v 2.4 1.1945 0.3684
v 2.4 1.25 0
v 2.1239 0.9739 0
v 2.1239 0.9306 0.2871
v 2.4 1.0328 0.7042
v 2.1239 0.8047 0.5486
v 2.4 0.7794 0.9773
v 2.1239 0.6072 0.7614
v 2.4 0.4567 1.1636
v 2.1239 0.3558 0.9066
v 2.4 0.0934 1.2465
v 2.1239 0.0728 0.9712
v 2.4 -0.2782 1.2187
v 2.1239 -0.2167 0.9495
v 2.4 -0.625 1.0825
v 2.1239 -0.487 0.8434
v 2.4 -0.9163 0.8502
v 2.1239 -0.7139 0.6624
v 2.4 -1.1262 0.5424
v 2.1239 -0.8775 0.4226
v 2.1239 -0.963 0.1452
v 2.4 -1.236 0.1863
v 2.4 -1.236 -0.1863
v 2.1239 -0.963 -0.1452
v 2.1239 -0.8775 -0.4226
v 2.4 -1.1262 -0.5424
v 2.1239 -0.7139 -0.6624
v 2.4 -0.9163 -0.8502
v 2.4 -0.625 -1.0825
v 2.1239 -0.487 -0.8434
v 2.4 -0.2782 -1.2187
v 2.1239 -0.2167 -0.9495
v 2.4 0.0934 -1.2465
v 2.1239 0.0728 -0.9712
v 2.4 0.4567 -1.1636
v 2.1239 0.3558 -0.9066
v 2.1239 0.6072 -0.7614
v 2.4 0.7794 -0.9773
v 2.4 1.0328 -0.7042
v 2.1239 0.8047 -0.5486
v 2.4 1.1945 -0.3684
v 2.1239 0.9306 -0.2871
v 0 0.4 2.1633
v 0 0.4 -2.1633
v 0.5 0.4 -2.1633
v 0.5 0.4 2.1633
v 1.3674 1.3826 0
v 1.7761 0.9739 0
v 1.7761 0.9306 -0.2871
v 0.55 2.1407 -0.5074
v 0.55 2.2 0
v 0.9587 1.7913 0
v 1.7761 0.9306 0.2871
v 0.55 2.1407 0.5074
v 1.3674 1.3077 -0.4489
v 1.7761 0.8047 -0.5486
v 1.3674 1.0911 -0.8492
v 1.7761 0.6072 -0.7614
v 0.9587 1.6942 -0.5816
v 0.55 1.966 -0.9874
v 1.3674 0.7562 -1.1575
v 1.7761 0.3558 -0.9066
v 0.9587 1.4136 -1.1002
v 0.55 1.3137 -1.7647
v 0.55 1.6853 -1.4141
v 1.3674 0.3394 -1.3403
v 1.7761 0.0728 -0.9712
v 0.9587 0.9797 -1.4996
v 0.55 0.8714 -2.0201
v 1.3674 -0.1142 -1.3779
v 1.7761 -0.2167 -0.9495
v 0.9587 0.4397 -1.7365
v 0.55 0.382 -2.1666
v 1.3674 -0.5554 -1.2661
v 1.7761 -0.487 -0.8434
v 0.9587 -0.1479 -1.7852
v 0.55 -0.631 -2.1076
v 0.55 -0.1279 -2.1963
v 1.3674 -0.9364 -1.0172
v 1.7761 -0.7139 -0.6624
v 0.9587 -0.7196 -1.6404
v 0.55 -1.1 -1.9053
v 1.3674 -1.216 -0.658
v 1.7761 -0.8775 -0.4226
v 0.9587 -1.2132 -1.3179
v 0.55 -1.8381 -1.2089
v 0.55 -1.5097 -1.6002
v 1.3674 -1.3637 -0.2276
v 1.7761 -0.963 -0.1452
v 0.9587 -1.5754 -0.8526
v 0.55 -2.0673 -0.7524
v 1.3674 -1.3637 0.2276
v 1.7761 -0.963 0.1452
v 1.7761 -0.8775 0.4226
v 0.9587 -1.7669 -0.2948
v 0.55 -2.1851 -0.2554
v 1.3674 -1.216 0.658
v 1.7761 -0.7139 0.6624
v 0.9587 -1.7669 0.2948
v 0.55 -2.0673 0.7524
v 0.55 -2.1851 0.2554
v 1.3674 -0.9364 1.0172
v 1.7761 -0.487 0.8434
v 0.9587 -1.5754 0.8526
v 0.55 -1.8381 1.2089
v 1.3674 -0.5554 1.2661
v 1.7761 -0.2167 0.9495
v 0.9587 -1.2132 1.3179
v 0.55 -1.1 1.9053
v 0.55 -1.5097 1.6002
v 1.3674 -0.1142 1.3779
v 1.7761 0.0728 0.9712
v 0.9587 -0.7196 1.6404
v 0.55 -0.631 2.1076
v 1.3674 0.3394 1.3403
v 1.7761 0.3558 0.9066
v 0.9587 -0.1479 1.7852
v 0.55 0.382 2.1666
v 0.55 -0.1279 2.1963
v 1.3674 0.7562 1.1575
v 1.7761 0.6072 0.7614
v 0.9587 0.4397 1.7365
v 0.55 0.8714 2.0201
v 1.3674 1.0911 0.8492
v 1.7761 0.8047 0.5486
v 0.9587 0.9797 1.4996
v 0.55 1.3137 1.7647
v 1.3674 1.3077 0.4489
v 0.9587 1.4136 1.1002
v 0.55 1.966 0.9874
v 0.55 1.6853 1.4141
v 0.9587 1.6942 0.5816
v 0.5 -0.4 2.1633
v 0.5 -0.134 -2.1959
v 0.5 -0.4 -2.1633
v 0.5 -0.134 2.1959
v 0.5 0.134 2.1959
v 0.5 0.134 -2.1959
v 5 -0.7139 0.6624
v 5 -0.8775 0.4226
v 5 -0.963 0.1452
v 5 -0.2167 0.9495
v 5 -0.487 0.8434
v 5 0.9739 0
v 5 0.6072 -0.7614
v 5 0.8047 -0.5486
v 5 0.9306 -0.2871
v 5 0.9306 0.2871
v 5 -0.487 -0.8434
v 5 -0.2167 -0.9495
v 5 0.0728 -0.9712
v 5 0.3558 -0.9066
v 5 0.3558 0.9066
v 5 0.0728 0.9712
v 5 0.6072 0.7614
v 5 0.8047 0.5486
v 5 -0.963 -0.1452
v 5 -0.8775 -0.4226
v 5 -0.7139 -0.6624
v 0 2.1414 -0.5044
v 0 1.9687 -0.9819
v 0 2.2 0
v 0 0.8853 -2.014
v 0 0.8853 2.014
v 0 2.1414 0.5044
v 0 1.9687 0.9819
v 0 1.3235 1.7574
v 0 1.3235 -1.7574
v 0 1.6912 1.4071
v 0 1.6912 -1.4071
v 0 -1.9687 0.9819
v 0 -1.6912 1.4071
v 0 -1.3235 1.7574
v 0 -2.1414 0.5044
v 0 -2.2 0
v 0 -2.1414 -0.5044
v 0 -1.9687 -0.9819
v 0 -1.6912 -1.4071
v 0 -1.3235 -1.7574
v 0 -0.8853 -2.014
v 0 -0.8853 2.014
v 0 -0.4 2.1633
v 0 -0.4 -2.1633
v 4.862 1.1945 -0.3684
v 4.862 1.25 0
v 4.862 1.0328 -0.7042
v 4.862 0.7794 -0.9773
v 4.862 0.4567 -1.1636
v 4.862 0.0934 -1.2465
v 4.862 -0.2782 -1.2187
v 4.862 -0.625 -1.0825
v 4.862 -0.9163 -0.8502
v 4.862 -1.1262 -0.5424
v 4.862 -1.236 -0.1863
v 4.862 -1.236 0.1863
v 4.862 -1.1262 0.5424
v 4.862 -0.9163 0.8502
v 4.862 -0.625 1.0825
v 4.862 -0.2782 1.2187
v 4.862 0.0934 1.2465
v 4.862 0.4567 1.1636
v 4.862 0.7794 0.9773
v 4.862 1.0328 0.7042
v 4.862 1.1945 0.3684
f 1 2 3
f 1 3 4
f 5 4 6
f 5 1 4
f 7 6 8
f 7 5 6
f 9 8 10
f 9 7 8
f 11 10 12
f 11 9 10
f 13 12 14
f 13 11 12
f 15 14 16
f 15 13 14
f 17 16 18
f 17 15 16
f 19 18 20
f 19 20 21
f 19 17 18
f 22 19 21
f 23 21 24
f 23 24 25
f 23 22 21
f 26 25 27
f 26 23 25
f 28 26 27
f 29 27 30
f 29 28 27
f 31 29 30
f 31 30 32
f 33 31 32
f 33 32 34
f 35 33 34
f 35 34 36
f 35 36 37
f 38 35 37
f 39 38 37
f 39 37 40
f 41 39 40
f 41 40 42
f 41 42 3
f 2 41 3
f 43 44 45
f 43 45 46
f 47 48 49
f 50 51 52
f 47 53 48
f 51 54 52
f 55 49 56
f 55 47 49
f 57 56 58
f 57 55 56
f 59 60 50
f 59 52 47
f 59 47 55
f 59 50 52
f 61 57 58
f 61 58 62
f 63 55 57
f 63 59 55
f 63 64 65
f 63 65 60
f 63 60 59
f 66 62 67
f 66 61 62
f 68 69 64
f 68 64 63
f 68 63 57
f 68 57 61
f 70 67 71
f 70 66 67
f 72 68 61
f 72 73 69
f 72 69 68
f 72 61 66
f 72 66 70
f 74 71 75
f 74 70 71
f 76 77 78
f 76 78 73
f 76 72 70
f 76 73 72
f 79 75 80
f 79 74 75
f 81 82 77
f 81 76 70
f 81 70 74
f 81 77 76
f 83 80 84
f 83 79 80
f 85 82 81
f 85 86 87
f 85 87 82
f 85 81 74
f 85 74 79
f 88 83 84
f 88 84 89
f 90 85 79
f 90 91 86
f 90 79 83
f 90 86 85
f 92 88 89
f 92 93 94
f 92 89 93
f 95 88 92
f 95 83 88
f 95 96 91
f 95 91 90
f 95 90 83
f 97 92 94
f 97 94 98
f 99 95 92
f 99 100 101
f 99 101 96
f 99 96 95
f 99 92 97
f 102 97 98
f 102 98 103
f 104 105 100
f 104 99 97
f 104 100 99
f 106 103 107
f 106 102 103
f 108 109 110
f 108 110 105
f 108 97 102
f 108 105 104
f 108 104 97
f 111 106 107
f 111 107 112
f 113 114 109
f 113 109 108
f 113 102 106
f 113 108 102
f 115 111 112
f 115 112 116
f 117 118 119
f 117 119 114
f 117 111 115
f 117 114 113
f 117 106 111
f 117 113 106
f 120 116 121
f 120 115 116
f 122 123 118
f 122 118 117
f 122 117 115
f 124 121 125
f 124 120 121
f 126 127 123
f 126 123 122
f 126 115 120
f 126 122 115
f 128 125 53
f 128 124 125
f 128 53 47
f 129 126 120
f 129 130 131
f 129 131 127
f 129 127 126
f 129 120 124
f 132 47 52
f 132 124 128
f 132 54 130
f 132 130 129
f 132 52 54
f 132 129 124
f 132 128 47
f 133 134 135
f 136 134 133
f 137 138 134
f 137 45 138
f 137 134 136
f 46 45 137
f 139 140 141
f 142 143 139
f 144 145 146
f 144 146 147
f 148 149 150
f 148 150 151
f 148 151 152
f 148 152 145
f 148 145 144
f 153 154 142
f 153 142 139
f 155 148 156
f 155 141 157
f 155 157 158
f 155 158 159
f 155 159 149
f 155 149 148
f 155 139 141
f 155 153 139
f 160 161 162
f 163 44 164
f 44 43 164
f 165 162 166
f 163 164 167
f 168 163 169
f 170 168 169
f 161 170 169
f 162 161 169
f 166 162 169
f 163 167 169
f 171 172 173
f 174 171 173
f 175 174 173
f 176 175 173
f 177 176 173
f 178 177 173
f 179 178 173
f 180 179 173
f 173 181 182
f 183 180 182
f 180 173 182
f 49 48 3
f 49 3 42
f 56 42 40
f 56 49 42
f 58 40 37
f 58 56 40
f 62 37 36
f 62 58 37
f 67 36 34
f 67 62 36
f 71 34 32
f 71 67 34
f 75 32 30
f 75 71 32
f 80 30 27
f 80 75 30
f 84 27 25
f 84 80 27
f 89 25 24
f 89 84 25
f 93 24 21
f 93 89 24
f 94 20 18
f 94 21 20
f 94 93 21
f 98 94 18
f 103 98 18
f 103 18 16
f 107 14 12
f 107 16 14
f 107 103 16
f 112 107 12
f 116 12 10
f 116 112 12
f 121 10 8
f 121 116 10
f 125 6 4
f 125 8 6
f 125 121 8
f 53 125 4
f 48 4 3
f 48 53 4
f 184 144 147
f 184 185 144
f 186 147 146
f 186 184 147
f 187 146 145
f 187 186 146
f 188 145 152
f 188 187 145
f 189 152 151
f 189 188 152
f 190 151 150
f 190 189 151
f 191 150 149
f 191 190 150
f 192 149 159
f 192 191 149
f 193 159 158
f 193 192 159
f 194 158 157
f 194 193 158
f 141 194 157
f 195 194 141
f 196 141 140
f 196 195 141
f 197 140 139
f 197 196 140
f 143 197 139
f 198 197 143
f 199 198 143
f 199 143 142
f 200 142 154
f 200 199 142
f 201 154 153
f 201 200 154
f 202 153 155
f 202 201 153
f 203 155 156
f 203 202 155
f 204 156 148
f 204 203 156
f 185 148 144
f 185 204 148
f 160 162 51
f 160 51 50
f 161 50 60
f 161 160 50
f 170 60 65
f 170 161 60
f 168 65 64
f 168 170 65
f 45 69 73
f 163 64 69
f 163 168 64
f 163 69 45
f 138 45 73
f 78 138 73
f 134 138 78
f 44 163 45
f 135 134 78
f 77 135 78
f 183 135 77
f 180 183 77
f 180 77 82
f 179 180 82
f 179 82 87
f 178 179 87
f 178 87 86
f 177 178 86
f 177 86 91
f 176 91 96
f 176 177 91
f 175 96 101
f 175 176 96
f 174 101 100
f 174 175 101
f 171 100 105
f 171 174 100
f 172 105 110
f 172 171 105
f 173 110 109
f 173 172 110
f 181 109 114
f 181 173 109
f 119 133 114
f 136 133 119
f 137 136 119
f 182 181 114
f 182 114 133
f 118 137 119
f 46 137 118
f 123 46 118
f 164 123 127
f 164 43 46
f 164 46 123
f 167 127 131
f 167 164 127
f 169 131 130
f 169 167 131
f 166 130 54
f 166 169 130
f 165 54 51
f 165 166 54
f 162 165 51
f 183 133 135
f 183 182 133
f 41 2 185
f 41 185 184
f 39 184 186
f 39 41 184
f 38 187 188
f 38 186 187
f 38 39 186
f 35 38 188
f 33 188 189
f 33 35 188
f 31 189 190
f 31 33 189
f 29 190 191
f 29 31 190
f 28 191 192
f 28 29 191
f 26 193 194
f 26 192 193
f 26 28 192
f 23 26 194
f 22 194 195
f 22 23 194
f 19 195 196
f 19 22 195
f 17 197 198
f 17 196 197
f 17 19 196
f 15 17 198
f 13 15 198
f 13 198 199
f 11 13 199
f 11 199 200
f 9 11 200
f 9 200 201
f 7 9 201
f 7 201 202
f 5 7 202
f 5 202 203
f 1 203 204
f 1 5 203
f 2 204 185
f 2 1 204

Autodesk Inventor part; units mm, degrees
ref_plane "YZ Plane" through (0, 0, 0) normal (1, 0, 0) x (0, 1, 0)
ref_plane "XZ Plane" through (0, 0, 0) normal (0, 1, 0) x (-1, 0, 0)
sketch "Sketch1" plane through (0, 0, 0) normal (0, 0, 1) x (1, 0, 0)
  line L0 (0, 0) -> (5, 0)
  line L1 (5, 0) -> (5, 1.25)
  line L2 (5, 1.25) -> (2.4, 1.25)
  line L3 (2.4, 1.25) -> (2.1239, 0.9739)
  line L4 (2.1239, 0.9739) -> (1.7761, 0.9739)
  line L5 (1.7761, 0.9739) -> (0.55, 2.2)
  line L6 (0.55, 2.2) -> (0, 2.2)
  line L7 (0, 2.2) -> (0, 0)
  line L8 (2.4, 1.25) -> (1.5, 1.25) construction
  line L9 (-1, 0) -> (6, 0) projected
  line L10 (0, 2.64) -> (0, -0.44) projected
  dimension "d0" = 5
  dimension "d1" = 45
  dimension "d2" = 0.2761
  dimension "d3" = 2.6
  dimension "d4" = 1.5
  dimension "d5" = 1.9479
  dimension "d6" = 2.5
  dimension "d7" = 4.4
revolve "Body" add sketch "Sketch1" angle 360 about axis through (0, 0, 0) along (1, 0, 0)
sketch "Sketch2" plane through (0, 0, 0) normal (-1, 0, 0) x (0, 0, 1)
  line L0 (2.2, -0.4) -> (-2.2, -0.4)
  line L1 (-2.2, -0.4) -> (-2.2, 0.4)
  line L2 (-2.2, 0.4) -> (2.2, 0.4)
  line L3 (2.2, 0.4) -> (2.2, -0.4)
  line L4 (0, 0.4) -> (0, -0.4) construction
  line L5 (-2.2, 0) -> (2.2, 0) construction
  line L6 (0, 2.2) -> (0, 0) projected
  dimension "d15" = 0.8
  dimension "d16" = 4.4
extrude "Slot" cut sketch "Sketch2" against normal blind 0.5
thread "Thread" size "M2.5x0.45" class "6g" standard "ISO Metric profile" length 2.6
chamfer "Chamfer1" distance 0.2761 distance2 0.138 1 edges at (5, -1.25, 0) measured on face at (5, -0.3689, 0.4922)
ref_plane "Work Plane1" through (33.575, 0, 0) normal (0, 0, -1) x (1, 0, 0)
equation "\"d0\" = NLG"
equation "\"d1\" = 0.5 * SEWI"
equation "\"d2\" = GAL"
equation "\"d3\" = GEL"
equation "\"d4\" = KOH"
equation "\"d5\" = BDM"
equation "\"d6\" = GD"
equation "\"d7\" = KOD"
equation "\"d15\" = SBR"
equation "\"d16\" = KOD"
equation "\"d8\" = STI"
equation "\"d10\" = GEL"
equation "\"d12\" = -0.5 * SPD + 0.5 * GD"
equation "\"d13\" = 0.5 * GAL"
equation "\"NLG\" = 5"
equation "\"GAL\" = 0.61345 * PTC"
equation "\"GEL\" = 2.6"
equation "\"KOH\" = 1.5"
equation "\"KOD\" = 4.4"
equation "\"SEWI\" = 90deg"
equation "\"BDM\" = NND - 1.2269 * PTC"
equation "\"GD\" = NND"
equation "\"SBR\" = 0.8"
equation "\"STI\" = 0.5"
equation "\"SPD\" = NND - 1.2269 * PTC"
equation "\"GUL\" = 0.61345 * PTC"
equation "\"PTC\" = 0.45"
equation "\"EPV\" = 2.75"
equation "\"THREADDIA\" = 2.5"
equation "\"TOA\" = 30deg"
equation "\"RR\" = 0.3"
equation "\"NND\" = 2.5"
equation "\"GD1\" = THREADDIA - 1.2269 * PTC"
properties part number "AS 1427 - M2.5 x 5" material "Steel, Mild"
